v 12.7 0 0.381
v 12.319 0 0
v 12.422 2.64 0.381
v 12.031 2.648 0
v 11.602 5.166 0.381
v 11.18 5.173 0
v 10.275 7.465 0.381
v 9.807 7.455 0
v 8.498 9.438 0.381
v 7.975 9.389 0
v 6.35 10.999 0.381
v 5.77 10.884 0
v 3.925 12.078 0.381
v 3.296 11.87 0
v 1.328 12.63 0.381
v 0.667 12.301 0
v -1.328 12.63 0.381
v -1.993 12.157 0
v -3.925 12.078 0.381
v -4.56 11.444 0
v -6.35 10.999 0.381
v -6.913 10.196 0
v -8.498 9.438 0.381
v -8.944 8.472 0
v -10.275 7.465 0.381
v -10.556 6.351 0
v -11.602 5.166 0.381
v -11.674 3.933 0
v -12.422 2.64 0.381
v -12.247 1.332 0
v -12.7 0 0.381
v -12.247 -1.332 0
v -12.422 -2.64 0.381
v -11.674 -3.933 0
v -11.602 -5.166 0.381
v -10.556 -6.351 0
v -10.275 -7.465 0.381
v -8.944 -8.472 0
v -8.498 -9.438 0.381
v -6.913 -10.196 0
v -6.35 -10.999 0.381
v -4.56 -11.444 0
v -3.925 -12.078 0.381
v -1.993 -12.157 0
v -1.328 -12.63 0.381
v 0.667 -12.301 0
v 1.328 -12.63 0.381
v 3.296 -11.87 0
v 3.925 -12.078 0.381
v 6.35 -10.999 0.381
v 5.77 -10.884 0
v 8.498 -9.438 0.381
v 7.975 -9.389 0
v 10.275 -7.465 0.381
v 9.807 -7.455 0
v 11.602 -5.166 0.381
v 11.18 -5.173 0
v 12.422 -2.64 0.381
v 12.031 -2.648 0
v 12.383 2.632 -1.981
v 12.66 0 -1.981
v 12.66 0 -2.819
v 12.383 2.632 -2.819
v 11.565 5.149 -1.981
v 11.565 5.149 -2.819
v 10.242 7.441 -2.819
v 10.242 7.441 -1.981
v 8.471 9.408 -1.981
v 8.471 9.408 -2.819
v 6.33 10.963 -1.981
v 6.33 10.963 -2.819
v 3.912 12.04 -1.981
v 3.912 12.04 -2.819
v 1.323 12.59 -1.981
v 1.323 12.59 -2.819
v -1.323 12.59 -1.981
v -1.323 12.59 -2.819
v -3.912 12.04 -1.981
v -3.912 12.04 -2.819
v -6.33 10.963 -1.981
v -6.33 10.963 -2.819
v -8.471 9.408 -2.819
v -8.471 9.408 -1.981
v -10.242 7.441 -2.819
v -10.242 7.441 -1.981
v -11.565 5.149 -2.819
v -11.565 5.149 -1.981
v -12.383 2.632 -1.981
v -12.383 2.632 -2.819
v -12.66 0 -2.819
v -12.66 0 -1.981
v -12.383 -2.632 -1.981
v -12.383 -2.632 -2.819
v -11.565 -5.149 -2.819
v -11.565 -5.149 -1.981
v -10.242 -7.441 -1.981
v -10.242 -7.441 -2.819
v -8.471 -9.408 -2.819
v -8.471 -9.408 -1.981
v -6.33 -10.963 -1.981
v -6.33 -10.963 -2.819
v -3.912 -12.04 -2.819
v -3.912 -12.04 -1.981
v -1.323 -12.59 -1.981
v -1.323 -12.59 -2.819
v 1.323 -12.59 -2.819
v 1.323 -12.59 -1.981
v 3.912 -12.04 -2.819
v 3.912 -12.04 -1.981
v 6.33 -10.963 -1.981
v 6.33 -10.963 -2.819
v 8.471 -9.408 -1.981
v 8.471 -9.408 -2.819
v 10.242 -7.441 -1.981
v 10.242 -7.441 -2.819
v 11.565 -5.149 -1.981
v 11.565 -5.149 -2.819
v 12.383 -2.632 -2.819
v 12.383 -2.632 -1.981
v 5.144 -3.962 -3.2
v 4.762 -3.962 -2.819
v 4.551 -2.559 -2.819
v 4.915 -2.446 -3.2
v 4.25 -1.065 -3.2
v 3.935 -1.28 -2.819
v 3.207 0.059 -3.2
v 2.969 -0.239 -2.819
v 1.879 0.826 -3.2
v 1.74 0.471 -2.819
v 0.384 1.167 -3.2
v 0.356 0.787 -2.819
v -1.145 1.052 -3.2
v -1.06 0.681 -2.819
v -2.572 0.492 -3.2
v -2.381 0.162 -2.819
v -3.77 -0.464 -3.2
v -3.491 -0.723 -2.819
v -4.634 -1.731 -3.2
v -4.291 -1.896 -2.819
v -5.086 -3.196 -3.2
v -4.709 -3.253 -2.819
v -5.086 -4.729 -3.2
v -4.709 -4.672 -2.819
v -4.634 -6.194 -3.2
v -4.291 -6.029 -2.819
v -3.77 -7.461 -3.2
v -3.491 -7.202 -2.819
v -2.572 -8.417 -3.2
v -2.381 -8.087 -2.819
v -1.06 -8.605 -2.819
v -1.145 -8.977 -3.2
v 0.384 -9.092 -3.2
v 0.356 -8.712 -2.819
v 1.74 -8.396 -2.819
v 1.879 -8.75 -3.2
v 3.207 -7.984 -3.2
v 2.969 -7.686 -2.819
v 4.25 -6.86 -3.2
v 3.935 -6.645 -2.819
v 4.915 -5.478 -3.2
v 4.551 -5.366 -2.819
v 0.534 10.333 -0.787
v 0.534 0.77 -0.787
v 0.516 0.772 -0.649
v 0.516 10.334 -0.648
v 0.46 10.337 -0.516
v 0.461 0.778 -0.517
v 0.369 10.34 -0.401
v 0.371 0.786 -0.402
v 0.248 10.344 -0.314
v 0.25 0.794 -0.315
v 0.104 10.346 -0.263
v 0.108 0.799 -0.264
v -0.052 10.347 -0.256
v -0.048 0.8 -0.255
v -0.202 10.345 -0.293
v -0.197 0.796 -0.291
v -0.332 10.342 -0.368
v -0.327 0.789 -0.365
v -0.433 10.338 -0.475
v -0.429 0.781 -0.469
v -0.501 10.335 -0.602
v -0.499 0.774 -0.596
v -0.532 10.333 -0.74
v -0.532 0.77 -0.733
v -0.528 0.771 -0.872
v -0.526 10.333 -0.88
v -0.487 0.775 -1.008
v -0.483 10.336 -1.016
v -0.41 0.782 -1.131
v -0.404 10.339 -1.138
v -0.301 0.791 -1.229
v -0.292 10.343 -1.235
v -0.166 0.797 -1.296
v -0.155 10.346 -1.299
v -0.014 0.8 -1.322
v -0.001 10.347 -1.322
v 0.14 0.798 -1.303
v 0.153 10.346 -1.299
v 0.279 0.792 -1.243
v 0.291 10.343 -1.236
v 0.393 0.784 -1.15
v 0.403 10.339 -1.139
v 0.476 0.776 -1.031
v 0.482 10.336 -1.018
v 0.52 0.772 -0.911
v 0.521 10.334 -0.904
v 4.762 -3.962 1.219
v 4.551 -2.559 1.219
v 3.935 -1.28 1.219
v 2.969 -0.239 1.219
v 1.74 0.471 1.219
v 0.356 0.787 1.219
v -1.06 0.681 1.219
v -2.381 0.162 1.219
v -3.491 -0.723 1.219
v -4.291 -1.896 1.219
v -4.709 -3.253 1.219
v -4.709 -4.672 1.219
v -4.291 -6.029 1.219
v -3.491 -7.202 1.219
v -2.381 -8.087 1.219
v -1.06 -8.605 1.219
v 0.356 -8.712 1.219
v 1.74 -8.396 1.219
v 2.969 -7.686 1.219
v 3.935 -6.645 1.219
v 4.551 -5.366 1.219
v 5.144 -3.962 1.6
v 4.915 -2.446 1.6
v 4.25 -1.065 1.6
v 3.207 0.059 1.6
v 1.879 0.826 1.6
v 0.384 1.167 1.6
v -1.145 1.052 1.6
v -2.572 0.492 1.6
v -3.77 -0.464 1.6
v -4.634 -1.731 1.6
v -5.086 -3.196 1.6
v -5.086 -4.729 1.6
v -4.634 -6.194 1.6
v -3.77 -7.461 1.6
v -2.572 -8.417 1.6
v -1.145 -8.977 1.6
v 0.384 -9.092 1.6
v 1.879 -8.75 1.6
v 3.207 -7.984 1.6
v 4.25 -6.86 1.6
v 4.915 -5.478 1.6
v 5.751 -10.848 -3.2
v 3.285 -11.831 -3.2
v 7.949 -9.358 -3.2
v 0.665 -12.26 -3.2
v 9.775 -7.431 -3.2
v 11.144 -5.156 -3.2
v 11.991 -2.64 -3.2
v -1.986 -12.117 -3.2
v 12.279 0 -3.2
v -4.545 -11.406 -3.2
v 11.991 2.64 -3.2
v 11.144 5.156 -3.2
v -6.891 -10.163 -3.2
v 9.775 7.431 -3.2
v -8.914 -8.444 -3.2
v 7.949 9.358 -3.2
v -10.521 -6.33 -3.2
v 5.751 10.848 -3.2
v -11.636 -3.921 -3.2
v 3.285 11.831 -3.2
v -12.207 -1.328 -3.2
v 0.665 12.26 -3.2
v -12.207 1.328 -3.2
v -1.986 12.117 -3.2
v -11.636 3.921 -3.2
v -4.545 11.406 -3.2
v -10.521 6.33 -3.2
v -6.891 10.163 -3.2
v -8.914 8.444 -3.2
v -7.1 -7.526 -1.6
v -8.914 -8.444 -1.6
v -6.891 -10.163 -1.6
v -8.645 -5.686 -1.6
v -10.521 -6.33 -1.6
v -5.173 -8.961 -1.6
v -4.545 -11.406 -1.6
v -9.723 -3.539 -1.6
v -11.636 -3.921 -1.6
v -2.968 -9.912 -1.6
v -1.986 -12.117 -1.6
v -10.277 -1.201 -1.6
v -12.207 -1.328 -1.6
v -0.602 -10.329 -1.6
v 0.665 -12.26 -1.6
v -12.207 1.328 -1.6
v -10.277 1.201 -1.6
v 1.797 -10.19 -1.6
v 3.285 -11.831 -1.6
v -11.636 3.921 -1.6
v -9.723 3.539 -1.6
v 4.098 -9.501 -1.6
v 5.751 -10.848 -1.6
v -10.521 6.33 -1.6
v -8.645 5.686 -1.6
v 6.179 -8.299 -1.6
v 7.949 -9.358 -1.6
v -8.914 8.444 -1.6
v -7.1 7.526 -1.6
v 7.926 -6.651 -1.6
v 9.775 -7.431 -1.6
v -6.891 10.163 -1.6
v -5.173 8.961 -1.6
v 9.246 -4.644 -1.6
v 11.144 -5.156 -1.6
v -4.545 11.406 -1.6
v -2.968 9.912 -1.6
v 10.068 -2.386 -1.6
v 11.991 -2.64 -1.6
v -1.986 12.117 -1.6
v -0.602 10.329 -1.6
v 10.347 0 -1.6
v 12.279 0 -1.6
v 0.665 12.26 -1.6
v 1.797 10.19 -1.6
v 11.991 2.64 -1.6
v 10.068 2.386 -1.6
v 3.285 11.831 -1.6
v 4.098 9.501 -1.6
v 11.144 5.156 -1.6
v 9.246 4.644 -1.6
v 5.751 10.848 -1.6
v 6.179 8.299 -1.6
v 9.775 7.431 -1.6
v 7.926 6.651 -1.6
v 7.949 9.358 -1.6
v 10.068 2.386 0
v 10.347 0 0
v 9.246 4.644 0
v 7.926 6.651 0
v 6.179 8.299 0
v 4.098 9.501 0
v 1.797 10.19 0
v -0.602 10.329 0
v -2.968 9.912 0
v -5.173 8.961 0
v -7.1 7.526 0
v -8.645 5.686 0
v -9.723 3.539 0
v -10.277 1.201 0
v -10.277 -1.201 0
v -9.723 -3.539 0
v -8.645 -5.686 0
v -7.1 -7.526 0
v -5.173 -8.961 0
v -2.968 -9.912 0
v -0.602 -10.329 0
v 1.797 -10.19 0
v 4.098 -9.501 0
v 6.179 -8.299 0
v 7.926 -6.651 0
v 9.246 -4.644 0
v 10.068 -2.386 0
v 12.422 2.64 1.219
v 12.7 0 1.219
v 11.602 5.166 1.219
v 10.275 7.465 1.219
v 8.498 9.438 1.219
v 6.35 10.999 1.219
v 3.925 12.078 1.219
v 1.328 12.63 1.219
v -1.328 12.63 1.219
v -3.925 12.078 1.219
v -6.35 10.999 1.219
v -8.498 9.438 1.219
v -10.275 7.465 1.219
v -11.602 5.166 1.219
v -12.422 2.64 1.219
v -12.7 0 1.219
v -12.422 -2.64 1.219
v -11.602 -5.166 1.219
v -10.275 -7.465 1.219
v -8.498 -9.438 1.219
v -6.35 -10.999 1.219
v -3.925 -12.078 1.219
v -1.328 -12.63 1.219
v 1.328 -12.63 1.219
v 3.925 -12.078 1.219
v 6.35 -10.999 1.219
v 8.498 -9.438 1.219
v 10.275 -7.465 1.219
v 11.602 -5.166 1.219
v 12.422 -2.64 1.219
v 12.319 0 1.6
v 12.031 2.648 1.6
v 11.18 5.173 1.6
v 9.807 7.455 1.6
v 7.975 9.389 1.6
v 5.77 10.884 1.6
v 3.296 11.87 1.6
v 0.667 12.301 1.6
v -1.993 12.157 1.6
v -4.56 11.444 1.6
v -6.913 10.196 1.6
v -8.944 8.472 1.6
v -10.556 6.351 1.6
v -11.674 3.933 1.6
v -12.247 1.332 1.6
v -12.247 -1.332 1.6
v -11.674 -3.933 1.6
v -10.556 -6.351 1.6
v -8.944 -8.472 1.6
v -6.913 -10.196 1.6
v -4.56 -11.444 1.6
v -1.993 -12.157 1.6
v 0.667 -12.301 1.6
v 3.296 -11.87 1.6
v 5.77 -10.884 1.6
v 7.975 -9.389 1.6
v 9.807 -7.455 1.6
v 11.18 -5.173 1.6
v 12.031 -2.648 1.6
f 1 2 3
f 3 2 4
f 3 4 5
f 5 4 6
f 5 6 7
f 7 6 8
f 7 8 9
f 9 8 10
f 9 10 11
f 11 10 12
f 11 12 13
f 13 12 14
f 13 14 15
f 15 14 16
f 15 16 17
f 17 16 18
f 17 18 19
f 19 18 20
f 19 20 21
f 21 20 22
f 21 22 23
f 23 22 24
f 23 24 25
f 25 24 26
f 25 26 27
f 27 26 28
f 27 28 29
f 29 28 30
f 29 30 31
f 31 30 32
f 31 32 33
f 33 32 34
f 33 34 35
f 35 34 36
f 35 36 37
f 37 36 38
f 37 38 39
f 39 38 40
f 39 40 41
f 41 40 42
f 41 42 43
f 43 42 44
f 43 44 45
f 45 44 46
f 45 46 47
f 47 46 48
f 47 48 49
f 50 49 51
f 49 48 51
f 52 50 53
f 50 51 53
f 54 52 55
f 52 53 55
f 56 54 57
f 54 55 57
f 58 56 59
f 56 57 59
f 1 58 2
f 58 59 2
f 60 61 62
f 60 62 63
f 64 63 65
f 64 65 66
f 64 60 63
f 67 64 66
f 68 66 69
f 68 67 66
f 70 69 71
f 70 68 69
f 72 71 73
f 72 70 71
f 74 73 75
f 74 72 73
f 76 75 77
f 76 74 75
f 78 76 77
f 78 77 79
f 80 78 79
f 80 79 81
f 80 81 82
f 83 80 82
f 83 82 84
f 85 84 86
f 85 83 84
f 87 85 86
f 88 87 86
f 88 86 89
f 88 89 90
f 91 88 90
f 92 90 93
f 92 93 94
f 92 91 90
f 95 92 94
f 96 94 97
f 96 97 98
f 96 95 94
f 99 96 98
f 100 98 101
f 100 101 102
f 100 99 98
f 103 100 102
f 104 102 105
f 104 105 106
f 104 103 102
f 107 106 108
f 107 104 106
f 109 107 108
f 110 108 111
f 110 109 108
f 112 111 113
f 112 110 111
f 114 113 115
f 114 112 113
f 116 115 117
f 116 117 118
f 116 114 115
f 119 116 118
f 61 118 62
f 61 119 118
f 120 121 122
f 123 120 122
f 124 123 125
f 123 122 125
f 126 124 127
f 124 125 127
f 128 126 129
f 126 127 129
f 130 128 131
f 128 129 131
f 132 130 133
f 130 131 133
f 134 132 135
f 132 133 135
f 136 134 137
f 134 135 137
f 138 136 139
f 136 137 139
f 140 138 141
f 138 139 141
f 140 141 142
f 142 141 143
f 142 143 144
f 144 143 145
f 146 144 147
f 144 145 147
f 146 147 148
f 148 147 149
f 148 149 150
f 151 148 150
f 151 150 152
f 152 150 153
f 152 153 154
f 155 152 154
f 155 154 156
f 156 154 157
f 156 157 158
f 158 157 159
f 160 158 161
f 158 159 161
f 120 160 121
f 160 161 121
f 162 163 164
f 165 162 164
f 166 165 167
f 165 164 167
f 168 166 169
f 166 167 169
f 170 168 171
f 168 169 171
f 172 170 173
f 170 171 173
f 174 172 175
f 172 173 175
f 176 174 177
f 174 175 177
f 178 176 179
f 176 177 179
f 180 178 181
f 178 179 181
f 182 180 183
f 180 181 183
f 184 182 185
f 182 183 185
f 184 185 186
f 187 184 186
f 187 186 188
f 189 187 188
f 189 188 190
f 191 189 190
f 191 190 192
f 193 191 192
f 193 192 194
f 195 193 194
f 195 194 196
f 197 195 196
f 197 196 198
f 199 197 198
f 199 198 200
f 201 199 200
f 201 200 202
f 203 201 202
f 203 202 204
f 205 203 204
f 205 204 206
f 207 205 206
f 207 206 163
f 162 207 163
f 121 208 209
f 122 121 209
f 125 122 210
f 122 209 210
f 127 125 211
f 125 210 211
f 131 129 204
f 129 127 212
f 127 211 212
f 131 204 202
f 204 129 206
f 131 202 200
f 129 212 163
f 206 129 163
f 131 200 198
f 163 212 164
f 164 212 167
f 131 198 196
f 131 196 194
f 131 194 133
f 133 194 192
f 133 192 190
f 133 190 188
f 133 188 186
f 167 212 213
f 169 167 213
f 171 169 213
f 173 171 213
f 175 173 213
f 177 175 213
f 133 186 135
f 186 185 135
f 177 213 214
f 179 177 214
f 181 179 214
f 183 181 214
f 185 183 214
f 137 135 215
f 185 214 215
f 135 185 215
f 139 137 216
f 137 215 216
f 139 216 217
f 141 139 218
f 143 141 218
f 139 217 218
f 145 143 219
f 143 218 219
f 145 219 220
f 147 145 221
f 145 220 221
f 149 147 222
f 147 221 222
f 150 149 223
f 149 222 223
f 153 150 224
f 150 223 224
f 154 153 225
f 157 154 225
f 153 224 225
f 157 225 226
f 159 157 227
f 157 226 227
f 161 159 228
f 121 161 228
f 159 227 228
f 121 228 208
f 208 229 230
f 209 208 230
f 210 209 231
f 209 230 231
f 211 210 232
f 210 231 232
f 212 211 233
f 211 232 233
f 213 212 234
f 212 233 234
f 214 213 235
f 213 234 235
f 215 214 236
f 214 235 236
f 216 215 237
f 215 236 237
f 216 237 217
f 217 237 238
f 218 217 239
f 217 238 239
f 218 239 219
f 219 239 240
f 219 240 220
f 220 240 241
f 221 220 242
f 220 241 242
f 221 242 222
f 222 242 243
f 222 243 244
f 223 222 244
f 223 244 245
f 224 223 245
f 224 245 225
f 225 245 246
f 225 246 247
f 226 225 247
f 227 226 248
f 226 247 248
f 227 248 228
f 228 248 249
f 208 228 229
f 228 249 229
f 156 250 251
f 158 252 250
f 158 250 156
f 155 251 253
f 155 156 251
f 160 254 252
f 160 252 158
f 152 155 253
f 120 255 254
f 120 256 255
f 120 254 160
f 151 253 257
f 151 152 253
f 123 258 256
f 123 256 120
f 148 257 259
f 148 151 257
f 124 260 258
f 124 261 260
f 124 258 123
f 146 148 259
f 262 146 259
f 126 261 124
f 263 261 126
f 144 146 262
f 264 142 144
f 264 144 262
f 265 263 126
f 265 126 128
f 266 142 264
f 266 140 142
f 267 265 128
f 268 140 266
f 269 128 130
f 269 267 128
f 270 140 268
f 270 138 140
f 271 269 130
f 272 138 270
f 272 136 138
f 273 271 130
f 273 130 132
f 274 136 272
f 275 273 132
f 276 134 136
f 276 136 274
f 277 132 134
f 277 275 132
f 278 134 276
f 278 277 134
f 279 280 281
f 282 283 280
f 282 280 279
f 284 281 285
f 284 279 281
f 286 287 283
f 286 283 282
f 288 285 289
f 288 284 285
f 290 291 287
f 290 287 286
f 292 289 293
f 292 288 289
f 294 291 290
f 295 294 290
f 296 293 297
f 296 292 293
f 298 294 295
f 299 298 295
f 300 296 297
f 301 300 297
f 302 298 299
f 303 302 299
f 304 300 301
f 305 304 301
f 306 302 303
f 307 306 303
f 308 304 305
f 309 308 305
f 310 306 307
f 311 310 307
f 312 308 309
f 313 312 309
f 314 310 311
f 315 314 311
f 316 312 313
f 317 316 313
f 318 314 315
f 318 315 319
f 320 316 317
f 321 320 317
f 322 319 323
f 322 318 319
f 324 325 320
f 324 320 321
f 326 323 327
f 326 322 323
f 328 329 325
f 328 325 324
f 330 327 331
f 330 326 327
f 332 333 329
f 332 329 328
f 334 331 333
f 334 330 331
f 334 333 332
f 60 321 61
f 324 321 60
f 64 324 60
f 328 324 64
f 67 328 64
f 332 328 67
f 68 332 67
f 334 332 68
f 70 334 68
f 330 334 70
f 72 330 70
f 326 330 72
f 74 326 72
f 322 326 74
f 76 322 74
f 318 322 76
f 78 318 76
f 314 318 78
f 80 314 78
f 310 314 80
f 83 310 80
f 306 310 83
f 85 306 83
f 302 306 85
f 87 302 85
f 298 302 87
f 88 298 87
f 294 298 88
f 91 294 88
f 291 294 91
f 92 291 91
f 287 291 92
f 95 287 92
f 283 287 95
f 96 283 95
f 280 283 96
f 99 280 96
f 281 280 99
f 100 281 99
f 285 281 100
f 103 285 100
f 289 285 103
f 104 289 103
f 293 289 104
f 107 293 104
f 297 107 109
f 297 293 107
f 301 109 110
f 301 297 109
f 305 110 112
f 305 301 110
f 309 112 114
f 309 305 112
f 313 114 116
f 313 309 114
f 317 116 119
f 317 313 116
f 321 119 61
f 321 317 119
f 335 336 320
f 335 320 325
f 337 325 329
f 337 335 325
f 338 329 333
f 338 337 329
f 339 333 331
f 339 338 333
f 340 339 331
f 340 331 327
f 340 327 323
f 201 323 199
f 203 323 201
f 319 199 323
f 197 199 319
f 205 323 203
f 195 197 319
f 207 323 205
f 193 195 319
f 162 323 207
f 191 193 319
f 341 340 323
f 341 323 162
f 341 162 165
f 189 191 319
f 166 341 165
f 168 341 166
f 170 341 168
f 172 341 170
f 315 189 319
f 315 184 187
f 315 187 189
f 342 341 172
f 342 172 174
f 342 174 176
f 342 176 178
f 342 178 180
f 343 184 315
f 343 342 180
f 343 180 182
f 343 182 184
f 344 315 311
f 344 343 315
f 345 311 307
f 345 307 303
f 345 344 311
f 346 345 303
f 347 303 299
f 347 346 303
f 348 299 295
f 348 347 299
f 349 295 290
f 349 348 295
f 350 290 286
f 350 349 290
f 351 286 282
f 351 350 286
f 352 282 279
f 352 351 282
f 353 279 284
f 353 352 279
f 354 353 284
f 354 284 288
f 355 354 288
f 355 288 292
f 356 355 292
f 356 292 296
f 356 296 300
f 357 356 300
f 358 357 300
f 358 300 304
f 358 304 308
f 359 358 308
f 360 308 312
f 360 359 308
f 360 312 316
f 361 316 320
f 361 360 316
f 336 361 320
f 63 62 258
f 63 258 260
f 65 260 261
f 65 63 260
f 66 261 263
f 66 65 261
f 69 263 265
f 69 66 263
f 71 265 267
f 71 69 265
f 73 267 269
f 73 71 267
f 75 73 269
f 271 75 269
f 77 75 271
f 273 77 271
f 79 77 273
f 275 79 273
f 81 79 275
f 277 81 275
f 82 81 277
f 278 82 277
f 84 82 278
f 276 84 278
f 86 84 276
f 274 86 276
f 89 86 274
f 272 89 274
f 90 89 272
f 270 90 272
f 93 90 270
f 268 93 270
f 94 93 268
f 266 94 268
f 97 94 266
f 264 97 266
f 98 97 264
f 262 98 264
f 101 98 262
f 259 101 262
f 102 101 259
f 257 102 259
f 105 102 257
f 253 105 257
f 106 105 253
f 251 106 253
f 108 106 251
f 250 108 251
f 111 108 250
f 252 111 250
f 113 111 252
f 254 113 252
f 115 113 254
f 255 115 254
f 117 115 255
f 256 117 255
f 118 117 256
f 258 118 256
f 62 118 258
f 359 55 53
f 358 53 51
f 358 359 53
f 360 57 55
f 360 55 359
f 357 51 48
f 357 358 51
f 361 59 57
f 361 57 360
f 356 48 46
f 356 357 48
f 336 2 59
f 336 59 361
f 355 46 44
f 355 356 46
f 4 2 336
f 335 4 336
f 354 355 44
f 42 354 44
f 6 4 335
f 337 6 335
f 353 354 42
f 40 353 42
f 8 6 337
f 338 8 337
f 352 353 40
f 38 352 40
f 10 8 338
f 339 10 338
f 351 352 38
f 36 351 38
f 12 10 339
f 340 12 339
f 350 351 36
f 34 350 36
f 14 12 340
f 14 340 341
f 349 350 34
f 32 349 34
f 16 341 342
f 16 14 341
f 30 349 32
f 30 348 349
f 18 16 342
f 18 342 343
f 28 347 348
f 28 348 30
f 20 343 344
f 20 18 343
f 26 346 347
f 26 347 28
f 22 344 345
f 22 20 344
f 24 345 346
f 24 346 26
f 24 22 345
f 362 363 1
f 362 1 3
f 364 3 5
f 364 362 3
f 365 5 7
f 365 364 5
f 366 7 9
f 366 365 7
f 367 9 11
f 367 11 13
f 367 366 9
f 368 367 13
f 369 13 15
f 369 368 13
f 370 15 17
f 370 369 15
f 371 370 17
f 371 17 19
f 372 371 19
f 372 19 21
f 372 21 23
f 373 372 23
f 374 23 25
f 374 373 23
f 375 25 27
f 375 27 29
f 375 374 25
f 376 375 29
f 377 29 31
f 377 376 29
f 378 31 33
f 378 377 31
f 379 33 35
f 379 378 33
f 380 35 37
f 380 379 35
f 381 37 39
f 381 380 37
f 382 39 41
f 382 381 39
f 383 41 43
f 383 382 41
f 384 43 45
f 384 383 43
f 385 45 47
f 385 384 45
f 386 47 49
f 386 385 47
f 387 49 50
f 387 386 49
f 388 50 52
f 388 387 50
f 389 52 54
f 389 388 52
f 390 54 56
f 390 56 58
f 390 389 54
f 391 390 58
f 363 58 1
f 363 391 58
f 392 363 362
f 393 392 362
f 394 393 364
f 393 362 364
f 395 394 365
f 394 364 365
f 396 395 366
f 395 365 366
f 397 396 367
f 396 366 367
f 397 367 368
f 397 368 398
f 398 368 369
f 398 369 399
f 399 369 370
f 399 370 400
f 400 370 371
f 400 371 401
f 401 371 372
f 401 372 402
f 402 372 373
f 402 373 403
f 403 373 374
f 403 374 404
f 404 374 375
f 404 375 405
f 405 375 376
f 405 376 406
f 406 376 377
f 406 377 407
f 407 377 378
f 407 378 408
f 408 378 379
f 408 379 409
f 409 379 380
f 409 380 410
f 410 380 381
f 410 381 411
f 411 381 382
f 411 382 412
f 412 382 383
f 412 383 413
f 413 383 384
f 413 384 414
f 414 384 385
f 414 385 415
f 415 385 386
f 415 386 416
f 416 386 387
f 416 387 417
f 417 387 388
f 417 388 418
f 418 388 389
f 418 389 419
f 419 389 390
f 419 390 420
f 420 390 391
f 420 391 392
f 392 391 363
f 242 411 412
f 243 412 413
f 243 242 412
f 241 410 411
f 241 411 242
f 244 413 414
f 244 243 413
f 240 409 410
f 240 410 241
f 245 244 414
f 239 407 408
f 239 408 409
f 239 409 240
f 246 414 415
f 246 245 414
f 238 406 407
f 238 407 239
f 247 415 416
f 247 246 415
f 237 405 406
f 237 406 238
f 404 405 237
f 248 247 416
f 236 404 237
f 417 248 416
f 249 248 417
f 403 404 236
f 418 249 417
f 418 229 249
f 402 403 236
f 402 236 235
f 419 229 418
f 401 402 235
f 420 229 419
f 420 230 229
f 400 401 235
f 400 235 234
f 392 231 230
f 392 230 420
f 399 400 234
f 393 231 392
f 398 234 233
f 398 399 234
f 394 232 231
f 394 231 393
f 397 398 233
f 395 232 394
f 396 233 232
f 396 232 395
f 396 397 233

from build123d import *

# Parameters (mm, degrees)
F2_R     = 4.7625
F3_DEPTH = 5.08
F4_SIZE  = 0.381
F5_R     = 0.534423
F6_DEPTH = 25.4


with BuildPart() as f1:
    # F0 (on Front) → F1 (revolve)
    with BuildSketch(Plane.XZ):
        Polygon((0, 1.6002), (0, 0), (0, -3.2004), (12.659507, -3.2004), (12.659507, -1.6002), (10.346893, -1.6002), (10.346893, 0), (12.7, 0), (12.7, 1.6002), align=None)
    revolve(axis=Axis((0, 0, 0.8001), (0, 0, 1)))

    # F2 (on face) → F3 (cut)
    with BuildSketch(Plane.XY.offset(1.6002)):
        with Locations((0, -3.9624)):
            Circle(F2_R)
    extrude(amount=-F3_DEPTH, mode=Mode.SUBTRACT)

    # F4
    f4_edges = [f1.edges().sort_by_distance(p)[0] for p in [
        (-4.7625, -3.9624, 1.6002),
        (-12.7, 0, 1.6002),
        (-12.7, 0, 0),
        (-12.659507, 0, -1.6002),
        (-12.659507, 0, -3.2004),
        (-4.7625, -3.9624, -3.2004),
    ]]
    chamfer(f4_edges, length=F4_SIZE)

    # F5 (on Front) → F6 (cut)
    with BuildSketch(Plane.XZ):
        with Locations((0, -0.787439)):
            Circle(F5_R)
    extrude(amount=-F6_DEPTH, mode=Mode.SUBTRACT)


solid = f1.part
